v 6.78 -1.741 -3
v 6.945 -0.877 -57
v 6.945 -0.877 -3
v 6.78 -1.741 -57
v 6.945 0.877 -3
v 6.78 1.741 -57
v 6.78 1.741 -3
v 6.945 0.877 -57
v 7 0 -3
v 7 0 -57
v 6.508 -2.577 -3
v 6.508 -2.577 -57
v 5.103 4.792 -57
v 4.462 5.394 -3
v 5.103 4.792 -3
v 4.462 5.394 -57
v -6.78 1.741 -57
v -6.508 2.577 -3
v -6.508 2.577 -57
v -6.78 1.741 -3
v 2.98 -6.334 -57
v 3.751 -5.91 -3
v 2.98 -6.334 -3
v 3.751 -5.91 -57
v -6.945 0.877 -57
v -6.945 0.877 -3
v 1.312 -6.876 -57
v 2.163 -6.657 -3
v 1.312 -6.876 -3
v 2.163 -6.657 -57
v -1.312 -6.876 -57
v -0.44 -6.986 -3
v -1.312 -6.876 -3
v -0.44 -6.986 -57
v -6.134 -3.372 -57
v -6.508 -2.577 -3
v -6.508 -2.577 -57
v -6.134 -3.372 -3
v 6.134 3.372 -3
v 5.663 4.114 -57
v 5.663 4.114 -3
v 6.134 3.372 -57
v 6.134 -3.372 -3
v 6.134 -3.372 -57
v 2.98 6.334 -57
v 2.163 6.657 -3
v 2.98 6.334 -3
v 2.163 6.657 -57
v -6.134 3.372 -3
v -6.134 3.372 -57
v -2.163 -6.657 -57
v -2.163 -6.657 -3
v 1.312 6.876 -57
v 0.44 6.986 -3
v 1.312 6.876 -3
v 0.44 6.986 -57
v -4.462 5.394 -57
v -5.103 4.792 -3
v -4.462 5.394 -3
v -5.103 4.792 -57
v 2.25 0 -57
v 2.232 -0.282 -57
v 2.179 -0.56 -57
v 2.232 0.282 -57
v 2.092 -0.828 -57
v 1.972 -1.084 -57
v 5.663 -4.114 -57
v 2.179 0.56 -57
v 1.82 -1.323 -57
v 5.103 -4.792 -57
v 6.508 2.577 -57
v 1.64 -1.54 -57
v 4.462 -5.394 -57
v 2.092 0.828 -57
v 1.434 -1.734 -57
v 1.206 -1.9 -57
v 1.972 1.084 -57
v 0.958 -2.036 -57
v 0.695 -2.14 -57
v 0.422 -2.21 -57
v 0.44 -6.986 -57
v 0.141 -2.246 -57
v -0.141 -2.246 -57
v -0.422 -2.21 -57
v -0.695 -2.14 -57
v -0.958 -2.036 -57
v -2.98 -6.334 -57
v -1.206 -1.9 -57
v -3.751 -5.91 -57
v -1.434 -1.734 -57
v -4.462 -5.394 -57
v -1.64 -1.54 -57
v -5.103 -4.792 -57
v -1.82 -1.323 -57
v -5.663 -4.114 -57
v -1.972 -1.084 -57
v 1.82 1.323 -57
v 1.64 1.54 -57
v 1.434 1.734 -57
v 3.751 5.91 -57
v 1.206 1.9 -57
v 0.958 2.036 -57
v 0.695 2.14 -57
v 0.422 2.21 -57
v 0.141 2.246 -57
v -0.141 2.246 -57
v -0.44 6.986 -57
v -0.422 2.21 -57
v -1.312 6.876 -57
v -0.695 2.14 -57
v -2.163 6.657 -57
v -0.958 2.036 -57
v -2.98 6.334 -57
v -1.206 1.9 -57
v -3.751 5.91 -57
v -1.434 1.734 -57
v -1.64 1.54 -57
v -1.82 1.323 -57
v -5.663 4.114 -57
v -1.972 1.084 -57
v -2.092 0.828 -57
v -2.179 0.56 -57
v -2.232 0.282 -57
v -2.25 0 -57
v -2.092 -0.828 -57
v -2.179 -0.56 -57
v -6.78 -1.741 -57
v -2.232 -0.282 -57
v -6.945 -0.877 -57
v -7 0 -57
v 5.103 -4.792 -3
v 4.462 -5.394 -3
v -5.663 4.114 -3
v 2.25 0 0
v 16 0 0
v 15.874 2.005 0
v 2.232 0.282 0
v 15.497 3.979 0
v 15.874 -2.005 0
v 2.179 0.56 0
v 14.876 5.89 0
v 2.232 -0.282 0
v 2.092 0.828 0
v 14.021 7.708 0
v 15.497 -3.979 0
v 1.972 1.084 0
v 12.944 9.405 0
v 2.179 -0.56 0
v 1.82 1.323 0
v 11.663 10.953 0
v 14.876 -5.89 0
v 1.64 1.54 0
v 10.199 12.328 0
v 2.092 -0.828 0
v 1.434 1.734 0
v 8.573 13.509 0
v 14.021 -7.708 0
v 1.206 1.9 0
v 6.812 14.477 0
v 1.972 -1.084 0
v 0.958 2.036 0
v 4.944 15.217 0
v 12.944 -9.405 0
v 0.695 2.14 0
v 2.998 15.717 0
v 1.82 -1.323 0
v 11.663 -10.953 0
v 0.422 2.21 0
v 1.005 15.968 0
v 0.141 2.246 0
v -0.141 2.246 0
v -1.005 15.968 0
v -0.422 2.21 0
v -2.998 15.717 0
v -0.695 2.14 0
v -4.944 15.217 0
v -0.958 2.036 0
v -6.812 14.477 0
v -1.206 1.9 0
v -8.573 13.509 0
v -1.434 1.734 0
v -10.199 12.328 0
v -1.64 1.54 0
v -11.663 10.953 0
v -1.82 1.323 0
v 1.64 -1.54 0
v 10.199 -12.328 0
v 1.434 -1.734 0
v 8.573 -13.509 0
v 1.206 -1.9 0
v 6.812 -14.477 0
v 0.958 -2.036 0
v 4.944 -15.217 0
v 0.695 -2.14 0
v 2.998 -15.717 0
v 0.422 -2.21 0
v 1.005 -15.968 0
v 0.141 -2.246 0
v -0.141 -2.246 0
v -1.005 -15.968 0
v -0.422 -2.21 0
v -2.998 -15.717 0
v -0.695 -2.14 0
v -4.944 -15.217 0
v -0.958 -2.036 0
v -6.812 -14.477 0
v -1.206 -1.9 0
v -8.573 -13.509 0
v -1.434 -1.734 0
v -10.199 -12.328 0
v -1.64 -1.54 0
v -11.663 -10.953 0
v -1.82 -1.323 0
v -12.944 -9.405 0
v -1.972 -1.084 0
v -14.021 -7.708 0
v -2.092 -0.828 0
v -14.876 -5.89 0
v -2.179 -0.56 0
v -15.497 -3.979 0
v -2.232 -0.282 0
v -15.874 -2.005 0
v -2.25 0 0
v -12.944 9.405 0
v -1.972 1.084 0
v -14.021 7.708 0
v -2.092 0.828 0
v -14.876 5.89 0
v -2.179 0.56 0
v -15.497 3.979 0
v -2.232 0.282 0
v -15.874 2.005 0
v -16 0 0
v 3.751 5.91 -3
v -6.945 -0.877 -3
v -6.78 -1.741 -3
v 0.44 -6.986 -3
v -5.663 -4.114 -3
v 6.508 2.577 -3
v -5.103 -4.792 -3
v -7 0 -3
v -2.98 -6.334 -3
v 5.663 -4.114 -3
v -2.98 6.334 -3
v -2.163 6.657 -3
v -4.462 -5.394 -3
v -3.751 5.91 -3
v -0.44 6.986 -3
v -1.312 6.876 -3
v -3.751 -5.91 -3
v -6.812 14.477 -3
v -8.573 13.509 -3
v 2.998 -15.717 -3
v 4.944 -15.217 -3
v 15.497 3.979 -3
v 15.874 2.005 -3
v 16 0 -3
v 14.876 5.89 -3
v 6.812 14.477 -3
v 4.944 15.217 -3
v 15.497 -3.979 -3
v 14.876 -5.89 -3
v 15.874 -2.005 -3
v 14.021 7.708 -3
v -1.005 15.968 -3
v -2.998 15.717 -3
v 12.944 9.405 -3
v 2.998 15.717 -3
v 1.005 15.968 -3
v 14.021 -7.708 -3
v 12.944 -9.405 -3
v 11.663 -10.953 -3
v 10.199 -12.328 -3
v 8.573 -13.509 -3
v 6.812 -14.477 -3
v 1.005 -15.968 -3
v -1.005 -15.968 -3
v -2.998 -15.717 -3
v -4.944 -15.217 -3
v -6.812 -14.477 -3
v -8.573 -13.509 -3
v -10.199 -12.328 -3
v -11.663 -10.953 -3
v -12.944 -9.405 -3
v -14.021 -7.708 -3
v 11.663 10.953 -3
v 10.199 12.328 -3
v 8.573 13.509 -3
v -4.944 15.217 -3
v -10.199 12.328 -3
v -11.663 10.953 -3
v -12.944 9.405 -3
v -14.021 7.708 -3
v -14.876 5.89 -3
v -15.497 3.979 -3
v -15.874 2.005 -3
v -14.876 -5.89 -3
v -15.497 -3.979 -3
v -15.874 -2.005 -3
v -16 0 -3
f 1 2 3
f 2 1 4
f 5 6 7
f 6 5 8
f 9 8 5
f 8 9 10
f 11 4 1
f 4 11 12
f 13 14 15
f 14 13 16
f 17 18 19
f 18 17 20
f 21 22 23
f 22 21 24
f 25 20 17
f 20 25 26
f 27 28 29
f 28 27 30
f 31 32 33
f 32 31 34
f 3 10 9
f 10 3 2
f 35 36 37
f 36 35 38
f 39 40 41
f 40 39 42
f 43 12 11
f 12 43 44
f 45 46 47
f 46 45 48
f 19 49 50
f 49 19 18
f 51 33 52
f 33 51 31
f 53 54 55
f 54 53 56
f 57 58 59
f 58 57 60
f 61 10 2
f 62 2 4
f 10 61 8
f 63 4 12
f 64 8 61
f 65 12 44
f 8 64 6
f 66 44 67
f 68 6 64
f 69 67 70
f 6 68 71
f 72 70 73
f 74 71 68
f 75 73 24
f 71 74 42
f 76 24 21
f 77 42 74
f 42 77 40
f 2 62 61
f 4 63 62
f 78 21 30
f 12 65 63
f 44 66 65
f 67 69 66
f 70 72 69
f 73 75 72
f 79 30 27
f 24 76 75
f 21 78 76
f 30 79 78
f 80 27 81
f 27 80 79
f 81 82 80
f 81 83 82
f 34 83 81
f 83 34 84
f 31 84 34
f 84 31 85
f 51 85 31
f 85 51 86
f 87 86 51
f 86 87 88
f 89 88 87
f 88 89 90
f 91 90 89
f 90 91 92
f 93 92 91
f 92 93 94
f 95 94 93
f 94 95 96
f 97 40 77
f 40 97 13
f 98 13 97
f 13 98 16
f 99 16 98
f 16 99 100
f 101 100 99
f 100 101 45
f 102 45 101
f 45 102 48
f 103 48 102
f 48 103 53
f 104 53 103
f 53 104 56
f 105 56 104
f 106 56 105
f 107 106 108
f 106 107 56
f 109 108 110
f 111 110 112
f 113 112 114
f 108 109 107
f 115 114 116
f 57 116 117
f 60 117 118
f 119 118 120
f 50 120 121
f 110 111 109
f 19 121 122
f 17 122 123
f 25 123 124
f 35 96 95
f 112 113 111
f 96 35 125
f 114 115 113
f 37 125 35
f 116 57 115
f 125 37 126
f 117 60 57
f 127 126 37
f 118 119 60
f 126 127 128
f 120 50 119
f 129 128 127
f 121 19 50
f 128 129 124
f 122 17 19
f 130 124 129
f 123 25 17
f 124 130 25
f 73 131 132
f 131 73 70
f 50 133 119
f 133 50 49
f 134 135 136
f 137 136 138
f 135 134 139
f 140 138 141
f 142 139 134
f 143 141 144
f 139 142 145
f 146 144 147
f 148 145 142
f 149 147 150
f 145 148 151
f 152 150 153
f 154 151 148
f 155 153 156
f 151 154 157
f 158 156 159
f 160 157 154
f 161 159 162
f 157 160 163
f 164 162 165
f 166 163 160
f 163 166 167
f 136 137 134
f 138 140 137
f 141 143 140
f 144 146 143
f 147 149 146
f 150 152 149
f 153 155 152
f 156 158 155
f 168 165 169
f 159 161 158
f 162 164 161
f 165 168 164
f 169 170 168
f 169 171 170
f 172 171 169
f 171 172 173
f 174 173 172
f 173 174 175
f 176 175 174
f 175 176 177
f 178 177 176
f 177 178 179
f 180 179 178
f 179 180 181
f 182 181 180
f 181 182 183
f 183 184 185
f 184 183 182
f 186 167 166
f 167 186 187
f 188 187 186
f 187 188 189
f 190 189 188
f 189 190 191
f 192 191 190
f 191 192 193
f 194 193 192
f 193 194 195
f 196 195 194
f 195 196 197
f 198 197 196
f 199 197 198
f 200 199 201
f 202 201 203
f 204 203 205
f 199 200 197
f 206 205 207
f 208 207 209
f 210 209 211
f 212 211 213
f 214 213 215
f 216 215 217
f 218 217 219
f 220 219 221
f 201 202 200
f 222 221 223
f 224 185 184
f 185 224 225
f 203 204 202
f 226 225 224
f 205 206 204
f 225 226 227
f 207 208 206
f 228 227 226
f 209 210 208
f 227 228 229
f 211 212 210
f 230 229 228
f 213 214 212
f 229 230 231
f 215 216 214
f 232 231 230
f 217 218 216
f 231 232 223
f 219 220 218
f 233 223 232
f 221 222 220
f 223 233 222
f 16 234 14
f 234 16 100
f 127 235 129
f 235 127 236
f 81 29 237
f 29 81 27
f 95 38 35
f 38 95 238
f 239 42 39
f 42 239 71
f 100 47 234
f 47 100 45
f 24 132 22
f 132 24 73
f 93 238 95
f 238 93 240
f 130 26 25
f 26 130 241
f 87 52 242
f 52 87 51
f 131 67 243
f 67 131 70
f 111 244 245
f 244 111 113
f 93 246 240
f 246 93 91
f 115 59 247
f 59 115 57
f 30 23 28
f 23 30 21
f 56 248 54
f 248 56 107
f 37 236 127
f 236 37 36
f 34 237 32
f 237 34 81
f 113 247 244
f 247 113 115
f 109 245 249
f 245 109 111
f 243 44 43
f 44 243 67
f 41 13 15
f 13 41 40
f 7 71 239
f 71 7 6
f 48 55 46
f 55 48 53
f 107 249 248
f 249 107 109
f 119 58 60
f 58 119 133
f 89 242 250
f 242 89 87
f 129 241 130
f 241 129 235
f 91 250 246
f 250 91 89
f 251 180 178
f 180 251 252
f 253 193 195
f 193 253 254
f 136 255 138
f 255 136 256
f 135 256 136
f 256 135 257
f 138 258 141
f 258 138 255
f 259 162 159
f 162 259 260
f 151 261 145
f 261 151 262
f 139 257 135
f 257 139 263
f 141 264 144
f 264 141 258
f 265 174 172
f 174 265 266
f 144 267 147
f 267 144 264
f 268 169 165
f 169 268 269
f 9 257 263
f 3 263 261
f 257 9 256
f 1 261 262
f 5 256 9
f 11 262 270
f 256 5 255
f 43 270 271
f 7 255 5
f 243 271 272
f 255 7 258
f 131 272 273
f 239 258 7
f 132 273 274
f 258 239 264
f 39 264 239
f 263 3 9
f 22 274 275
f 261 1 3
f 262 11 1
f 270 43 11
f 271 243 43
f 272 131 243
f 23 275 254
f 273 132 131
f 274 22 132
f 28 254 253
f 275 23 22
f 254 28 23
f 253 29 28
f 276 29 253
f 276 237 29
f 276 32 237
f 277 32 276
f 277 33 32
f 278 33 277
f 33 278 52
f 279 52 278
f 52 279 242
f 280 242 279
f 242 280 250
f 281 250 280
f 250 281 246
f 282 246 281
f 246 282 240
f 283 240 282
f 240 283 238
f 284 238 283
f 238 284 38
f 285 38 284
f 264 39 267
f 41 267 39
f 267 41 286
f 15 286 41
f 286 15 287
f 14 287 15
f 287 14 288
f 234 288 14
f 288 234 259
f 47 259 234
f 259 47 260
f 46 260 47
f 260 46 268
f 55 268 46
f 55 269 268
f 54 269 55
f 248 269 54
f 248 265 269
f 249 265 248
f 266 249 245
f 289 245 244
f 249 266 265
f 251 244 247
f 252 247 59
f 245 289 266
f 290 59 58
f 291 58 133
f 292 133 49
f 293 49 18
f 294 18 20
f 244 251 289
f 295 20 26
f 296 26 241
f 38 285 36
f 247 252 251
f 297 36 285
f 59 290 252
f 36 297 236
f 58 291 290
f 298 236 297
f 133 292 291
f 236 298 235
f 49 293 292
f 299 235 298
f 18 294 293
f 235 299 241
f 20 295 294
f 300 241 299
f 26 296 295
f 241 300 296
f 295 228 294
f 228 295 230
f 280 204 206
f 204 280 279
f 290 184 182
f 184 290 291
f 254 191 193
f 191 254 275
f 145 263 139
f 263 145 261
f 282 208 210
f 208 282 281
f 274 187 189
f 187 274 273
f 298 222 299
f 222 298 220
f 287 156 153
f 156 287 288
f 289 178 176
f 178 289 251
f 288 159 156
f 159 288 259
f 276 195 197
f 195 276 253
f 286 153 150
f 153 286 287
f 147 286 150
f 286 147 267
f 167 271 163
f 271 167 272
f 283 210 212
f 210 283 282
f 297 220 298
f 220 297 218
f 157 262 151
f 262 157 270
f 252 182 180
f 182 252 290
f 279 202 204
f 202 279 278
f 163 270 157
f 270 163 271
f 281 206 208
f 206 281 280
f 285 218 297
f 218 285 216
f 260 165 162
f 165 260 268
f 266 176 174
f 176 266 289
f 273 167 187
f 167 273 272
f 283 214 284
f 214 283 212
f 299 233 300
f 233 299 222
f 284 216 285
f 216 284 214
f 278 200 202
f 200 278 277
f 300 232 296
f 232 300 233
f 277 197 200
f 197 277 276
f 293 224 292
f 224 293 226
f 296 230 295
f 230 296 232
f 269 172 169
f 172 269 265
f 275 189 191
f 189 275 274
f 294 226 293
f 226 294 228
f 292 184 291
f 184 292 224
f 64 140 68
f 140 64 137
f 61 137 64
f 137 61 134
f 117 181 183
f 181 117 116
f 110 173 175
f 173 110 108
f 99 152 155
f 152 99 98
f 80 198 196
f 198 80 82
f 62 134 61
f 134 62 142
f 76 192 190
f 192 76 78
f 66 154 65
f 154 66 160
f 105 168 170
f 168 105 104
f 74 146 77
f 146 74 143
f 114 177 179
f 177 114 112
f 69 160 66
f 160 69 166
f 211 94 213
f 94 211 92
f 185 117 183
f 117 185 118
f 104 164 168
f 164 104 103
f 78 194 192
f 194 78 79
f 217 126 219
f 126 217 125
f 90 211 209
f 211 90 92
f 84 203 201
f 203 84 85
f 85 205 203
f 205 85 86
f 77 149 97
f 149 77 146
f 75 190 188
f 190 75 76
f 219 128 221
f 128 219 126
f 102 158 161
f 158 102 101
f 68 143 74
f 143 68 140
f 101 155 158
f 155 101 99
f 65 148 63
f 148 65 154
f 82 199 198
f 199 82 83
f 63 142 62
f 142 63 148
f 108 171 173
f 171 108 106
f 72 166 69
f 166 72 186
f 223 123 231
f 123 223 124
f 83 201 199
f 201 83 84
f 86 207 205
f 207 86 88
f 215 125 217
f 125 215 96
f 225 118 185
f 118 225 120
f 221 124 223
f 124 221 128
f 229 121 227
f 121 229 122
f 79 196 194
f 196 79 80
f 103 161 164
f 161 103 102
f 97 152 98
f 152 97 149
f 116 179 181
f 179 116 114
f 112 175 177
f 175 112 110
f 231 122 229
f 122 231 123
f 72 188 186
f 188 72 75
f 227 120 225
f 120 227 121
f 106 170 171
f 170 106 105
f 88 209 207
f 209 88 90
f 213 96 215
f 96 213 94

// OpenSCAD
$fn = 50;


difference() {
	union() {
		translate(v = [0, 0, -57.0000000000]) {
			cylinder(h = 57, r = 7.0000000000);
		}
		translate(v = [0, 0, -3.0000000000]) {
			cylinder(h = 3, r = 16.0000000000);
		}
	}
	union() {
		#translate(v = [0, 0, -57]) {
			cylinder(h = 57, r = 2.2500000000);
		}
	}
}
